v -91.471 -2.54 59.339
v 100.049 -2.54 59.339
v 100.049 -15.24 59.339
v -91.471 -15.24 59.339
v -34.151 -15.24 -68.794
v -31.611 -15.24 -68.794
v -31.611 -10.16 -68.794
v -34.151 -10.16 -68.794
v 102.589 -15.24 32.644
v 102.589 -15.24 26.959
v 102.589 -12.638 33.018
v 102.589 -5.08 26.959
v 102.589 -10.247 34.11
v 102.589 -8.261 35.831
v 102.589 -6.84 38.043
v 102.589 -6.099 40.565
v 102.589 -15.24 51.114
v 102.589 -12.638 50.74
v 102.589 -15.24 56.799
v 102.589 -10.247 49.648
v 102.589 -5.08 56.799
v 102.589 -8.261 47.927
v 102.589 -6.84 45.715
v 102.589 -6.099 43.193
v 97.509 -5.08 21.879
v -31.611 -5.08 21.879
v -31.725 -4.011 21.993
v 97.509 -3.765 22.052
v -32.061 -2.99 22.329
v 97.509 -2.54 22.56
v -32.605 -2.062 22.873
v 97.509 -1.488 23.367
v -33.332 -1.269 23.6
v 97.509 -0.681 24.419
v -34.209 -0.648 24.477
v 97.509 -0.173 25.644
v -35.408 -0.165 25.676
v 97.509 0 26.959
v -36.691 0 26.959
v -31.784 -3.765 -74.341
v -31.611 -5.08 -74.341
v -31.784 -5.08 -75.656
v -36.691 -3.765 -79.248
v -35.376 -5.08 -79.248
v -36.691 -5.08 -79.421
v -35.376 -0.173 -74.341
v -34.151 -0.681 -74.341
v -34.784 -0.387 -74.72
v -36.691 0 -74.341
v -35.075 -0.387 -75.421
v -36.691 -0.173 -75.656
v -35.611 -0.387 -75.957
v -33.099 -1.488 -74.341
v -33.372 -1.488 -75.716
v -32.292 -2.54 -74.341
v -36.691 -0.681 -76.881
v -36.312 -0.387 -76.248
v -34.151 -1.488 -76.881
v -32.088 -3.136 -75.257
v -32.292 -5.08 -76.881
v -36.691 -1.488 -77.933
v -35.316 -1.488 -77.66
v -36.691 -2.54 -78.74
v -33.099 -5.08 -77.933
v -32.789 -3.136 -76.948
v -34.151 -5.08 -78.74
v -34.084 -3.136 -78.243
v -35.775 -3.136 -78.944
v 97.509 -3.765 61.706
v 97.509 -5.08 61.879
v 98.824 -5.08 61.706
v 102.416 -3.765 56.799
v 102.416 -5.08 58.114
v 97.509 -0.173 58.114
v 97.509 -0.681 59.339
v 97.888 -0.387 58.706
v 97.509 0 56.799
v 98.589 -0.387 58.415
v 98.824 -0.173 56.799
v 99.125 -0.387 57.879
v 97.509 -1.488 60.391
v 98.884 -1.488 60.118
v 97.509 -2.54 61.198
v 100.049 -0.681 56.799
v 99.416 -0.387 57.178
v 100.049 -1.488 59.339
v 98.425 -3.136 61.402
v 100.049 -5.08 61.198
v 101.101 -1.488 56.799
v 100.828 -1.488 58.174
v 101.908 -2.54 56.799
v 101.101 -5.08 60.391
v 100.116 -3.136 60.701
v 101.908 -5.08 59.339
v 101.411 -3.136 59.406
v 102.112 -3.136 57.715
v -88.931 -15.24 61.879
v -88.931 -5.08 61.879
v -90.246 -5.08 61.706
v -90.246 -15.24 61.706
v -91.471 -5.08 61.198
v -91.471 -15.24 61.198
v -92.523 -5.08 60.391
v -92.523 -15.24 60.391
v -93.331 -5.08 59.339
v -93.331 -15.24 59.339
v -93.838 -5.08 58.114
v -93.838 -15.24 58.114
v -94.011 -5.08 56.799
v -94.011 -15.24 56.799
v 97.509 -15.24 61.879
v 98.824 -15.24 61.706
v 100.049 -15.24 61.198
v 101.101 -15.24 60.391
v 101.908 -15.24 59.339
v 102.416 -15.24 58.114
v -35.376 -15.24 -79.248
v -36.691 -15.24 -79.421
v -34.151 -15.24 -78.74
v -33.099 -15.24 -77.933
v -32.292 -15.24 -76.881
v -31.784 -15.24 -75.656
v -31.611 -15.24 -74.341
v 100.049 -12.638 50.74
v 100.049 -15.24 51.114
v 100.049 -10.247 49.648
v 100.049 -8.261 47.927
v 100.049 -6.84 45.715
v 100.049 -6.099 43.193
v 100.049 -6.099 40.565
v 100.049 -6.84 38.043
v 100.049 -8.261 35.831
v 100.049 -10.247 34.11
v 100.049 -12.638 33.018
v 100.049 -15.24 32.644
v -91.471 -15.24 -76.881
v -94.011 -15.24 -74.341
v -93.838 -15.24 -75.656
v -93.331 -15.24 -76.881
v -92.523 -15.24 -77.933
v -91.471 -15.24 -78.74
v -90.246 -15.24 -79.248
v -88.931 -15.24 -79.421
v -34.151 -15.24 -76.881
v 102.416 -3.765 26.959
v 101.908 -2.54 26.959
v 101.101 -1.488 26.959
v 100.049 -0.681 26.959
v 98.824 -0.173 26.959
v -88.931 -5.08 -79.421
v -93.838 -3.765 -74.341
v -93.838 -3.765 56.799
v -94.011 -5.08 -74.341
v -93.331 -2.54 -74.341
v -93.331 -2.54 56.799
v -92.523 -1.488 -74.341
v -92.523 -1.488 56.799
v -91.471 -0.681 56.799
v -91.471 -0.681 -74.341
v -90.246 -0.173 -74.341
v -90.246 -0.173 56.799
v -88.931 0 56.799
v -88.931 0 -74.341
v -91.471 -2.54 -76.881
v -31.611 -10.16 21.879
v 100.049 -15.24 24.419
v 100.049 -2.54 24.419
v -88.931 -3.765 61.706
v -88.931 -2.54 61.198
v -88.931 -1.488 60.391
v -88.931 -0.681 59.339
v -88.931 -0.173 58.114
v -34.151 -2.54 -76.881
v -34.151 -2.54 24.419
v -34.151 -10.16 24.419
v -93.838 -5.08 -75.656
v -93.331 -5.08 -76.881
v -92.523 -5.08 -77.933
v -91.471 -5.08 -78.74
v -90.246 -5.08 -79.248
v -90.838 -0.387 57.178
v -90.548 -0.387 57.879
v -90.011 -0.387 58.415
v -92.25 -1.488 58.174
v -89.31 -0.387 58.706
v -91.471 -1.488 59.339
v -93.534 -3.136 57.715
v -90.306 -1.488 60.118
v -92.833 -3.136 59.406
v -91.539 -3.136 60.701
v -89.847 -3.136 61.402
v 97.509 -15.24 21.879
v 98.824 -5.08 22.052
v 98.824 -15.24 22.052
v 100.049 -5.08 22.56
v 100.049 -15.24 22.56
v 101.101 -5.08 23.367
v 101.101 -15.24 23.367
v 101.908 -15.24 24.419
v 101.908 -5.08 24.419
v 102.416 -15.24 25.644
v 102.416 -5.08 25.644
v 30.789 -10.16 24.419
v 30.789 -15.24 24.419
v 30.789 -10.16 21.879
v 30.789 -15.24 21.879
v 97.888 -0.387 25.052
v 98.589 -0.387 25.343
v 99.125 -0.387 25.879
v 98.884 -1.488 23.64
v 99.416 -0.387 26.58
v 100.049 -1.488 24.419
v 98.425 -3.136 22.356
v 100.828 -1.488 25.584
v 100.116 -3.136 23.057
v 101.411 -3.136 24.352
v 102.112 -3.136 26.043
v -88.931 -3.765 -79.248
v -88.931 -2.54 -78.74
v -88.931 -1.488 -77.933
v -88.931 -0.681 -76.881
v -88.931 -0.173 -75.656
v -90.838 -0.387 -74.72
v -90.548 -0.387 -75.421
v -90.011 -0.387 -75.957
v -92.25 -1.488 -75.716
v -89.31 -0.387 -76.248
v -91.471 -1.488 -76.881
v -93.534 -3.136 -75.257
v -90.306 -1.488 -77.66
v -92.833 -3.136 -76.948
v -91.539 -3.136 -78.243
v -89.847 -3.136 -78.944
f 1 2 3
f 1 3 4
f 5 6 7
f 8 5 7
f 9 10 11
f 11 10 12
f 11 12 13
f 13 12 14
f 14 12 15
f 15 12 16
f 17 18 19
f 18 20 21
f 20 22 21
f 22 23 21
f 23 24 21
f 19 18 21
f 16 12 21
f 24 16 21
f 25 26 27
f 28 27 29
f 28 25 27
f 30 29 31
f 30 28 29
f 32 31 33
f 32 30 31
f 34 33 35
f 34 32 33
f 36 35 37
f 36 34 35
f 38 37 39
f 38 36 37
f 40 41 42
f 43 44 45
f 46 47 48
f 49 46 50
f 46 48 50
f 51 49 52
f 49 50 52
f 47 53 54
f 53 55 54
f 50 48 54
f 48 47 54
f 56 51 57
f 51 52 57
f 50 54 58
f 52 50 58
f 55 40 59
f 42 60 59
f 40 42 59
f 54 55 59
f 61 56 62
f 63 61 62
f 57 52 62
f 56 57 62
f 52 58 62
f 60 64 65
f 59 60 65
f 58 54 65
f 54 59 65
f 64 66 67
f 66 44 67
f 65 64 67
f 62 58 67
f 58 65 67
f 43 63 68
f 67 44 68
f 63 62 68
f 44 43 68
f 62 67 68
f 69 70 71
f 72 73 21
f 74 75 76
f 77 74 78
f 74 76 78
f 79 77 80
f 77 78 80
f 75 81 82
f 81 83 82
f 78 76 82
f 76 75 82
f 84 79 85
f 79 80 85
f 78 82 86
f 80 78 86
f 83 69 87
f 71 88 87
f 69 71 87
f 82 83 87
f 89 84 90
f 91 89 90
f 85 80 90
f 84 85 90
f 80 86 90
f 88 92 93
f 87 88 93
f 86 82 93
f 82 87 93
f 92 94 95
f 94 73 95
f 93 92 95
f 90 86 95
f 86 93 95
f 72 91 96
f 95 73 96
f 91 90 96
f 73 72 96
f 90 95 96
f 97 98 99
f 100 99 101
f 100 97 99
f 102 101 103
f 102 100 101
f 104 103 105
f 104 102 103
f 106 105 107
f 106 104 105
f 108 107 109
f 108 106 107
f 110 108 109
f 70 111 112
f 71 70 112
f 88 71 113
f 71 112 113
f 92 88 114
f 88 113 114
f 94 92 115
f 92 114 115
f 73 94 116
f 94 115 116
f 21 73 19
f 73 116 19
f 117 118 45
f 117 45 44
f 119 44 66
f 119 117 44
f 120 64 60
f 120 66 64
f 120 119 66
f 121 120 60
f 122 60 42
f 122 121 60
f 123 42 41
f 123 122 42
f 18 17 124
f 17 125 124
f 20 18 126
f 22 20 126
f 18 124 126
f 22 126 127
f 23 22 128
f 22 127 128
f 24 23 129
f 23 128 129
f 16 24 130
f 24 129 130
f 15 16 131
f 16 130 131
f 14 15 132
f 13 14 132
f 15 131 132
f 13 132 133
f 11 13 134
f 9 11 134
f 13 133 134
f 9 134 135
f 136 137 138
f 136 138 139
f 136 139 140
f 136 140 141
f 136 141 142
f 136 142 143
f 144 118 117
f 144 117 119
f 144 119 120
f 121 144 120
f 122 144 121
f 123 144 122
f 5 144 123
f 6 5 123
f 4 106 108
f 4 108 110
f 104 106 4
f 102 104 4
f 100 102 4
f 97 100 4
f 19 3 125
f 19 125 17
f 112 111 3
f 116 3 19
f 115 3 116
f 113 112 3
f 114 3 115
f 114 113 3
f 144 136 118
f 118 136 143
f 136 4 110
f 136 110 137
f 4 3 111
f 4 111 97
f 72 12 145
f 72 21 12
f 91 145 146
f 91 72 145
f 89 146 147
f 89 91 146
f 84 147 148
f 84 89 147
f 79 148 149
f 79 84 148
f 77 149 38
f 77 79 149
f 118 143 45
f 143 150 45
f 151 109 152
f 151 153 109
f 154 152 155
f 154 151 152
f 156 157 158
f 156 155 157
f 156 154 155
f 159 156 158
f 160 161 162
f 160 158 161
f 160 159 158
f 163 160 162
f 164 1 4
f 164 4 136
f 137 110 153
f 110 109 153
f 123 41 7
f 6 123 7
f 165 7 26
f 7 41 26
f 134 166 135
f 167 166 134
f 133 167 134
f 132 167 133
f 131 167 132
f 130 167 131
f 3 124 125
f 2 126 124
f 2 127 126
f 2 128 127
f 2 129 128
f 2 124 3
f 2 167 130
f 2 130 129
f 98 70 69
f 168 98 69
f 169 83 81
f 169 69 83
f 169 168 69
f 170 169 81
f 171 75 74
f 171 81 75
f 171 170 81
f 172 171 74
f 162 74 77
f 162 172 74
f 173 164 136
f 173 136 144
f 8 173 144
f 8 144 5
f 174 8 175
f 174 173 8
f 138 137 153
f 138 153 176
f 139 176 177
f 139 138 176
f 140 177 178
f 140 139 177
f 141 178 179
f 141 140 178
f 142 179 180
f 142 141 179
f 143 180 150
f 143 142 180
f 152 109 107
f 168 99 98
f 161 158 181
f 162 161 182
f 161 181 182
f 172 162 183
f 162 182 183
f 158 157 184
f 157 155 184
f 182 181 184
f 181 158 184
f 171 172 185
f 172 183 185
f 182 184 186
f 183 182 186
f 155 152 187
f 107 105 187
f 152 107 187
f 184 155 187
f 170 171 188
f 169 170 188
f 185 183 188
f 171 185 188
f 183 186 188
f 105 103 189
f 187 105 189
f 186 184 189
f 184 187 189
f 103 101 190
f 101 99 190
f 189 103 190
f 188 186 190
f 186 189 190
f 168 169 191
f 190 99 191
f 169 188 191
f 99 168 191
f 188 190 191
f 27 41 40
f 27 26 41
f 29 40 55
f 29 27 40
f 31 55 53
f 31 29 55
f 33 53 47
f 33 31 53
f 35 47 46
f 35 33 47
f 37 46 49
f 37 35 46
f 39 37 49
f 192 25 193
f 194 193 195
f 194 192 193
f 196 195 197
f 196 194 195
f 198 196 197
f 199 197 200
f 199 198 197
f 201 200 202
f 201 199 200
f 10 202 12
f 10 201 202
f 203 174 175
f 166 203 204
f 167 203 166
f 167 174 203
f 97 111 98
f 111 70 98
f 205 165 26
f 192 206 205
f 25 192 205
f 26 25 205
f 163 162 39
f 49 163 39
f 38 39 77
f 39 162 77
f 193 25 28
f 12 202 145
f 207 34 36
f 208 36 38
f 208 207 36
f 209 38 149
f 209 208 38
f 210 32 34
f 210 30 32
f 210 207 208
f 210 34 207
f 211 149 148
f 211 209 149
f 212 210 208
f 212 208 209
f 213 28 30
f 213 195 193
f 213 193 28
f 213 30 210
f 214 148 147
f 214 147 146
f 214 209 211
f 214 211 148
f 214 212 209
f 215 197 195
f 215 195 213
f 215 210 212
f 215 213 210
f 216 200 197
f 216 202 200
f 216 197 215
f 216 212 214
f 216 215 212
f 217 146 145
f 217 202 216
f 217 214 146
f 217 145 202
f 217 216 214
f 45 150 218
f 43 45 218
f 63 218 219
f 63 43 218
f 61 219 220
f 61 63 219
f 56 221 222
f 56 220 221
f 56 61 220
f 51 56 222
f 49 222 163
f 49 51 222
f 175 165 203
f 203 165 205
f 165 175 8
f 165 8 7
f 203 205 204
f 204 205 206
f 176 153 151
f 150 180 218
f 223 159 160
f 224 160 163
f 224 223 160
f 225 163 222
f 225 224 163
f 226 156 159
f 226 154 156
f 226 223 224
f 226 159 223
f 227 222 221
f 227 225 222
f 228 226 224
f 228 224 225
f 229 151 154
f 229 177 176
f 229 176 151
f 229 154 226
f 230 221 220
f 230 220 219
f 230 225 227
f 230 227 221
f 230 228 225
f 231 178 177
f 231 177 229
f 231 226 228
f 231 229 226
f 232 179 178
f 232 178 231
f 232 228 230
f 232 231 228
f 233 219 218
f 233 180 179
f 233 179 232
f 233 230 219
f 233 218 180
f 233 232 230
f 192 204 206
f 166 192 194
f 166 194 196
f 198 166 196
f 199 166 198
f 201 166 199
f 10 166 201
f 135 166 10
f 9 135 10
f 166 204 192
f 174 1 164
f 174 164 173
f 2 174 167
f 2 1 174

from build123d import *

# Parameters (mm, degrees)
F1_DEPTH = 15.24
F2_T     = -2.54
F3_R     = 5.08
F5_D     = 18.47
F5_DEPTH = 14
F5_TIP   = 5.5489478167
F6_W     = 5.08
F6_H     = 90.6730847065
F7_DEPTH = 43.688
F8_W     = 64.9396401966
F8_H     = 5.08
F9_DEPTH = 25.4


with BuildPart() as f1:
    # F0 (on Front) → F1 (new body)
    with BuildSketch(Plane.XZ):
        Polygon((102.5888894677, 61.8790130322), (-94.0111105323, 61.8790130322), (-94.0111105323, -79.4209869678), (-31.6111105323, -79.4209869678), (-31.6111105323, 21.8790130322), (102.5888894677, 21.8790130322), align=None)
    extrude(amount=F1_DEPTH)

    # F2
    f2_openings = [f1.faces().sort_by_distance(p)[0] for p in [
        (100.16779, -15.24, 41.879013),
    ]]
    offset(amount=F2_T, openings=f2_openings, kind=Kind.INTERSECTION)

    # F3
    f3_edges = [f1.edges().sort_by_distance(p)[0] for p in [
        (-94.011111, -7.62, 61.879013),
        (102.588889, -7.62, 61.879013),
        (102.588889, -7.62, 21.879013),
        (-31.611111, -7.62, -79.420987),
        (-94.011111, -7.62, -79.420987),
        (-94.011111, 0, -8.770987),
        (-31.611111, 0, -28.770987),
        (35.488889, 0, 21.879013),
        (4.288889, 0, 61.879013),
        (-62.811111, 0, -79.420987),
        (102.588889, 0, 41.879013),
    ]]
    fillet(f3_edges, radius=F3_R)

    # F5
    with Locations(Plane.YZ.offset(102.5888894677)):
        with Locations((-15.24, 41.8790130322)):
            Hole(F5_D / 2, depth=F5_DEPTH)
            with Locations((0, 0, -(F5_DEPTH + F5_TIP / 2))):  # 118° drill point
                Cone(0, F5_D / 2, F5_TIP, mode=Mode.SUBTRACT)

    # F6 (on face) → F7 (cut)
    with BuildSketch(Plane.YZ.offset(-31.6111105323)):
        with Locations((-12.7, -23.4575293211)):
            Rectangle(F6_W, F6_H)
    extrude(amount=-F7_DEPTH, mode=Mode.SUBTRACT)

    # F8 (on face) → F9 (cut)
    with BuildSketch(Plane(origin=(0, 0, 21.8790130322), x_dir=(1, 0, 0), z_dir=(0, 0, -1))):
        with Locations((-1.681290434, 12.7)):
            Rectangle(F8_W, F8_H)
    extrude(amount=-F9_DEPTH, mode=Mode.SUBTRACT)


solid = f1.part
